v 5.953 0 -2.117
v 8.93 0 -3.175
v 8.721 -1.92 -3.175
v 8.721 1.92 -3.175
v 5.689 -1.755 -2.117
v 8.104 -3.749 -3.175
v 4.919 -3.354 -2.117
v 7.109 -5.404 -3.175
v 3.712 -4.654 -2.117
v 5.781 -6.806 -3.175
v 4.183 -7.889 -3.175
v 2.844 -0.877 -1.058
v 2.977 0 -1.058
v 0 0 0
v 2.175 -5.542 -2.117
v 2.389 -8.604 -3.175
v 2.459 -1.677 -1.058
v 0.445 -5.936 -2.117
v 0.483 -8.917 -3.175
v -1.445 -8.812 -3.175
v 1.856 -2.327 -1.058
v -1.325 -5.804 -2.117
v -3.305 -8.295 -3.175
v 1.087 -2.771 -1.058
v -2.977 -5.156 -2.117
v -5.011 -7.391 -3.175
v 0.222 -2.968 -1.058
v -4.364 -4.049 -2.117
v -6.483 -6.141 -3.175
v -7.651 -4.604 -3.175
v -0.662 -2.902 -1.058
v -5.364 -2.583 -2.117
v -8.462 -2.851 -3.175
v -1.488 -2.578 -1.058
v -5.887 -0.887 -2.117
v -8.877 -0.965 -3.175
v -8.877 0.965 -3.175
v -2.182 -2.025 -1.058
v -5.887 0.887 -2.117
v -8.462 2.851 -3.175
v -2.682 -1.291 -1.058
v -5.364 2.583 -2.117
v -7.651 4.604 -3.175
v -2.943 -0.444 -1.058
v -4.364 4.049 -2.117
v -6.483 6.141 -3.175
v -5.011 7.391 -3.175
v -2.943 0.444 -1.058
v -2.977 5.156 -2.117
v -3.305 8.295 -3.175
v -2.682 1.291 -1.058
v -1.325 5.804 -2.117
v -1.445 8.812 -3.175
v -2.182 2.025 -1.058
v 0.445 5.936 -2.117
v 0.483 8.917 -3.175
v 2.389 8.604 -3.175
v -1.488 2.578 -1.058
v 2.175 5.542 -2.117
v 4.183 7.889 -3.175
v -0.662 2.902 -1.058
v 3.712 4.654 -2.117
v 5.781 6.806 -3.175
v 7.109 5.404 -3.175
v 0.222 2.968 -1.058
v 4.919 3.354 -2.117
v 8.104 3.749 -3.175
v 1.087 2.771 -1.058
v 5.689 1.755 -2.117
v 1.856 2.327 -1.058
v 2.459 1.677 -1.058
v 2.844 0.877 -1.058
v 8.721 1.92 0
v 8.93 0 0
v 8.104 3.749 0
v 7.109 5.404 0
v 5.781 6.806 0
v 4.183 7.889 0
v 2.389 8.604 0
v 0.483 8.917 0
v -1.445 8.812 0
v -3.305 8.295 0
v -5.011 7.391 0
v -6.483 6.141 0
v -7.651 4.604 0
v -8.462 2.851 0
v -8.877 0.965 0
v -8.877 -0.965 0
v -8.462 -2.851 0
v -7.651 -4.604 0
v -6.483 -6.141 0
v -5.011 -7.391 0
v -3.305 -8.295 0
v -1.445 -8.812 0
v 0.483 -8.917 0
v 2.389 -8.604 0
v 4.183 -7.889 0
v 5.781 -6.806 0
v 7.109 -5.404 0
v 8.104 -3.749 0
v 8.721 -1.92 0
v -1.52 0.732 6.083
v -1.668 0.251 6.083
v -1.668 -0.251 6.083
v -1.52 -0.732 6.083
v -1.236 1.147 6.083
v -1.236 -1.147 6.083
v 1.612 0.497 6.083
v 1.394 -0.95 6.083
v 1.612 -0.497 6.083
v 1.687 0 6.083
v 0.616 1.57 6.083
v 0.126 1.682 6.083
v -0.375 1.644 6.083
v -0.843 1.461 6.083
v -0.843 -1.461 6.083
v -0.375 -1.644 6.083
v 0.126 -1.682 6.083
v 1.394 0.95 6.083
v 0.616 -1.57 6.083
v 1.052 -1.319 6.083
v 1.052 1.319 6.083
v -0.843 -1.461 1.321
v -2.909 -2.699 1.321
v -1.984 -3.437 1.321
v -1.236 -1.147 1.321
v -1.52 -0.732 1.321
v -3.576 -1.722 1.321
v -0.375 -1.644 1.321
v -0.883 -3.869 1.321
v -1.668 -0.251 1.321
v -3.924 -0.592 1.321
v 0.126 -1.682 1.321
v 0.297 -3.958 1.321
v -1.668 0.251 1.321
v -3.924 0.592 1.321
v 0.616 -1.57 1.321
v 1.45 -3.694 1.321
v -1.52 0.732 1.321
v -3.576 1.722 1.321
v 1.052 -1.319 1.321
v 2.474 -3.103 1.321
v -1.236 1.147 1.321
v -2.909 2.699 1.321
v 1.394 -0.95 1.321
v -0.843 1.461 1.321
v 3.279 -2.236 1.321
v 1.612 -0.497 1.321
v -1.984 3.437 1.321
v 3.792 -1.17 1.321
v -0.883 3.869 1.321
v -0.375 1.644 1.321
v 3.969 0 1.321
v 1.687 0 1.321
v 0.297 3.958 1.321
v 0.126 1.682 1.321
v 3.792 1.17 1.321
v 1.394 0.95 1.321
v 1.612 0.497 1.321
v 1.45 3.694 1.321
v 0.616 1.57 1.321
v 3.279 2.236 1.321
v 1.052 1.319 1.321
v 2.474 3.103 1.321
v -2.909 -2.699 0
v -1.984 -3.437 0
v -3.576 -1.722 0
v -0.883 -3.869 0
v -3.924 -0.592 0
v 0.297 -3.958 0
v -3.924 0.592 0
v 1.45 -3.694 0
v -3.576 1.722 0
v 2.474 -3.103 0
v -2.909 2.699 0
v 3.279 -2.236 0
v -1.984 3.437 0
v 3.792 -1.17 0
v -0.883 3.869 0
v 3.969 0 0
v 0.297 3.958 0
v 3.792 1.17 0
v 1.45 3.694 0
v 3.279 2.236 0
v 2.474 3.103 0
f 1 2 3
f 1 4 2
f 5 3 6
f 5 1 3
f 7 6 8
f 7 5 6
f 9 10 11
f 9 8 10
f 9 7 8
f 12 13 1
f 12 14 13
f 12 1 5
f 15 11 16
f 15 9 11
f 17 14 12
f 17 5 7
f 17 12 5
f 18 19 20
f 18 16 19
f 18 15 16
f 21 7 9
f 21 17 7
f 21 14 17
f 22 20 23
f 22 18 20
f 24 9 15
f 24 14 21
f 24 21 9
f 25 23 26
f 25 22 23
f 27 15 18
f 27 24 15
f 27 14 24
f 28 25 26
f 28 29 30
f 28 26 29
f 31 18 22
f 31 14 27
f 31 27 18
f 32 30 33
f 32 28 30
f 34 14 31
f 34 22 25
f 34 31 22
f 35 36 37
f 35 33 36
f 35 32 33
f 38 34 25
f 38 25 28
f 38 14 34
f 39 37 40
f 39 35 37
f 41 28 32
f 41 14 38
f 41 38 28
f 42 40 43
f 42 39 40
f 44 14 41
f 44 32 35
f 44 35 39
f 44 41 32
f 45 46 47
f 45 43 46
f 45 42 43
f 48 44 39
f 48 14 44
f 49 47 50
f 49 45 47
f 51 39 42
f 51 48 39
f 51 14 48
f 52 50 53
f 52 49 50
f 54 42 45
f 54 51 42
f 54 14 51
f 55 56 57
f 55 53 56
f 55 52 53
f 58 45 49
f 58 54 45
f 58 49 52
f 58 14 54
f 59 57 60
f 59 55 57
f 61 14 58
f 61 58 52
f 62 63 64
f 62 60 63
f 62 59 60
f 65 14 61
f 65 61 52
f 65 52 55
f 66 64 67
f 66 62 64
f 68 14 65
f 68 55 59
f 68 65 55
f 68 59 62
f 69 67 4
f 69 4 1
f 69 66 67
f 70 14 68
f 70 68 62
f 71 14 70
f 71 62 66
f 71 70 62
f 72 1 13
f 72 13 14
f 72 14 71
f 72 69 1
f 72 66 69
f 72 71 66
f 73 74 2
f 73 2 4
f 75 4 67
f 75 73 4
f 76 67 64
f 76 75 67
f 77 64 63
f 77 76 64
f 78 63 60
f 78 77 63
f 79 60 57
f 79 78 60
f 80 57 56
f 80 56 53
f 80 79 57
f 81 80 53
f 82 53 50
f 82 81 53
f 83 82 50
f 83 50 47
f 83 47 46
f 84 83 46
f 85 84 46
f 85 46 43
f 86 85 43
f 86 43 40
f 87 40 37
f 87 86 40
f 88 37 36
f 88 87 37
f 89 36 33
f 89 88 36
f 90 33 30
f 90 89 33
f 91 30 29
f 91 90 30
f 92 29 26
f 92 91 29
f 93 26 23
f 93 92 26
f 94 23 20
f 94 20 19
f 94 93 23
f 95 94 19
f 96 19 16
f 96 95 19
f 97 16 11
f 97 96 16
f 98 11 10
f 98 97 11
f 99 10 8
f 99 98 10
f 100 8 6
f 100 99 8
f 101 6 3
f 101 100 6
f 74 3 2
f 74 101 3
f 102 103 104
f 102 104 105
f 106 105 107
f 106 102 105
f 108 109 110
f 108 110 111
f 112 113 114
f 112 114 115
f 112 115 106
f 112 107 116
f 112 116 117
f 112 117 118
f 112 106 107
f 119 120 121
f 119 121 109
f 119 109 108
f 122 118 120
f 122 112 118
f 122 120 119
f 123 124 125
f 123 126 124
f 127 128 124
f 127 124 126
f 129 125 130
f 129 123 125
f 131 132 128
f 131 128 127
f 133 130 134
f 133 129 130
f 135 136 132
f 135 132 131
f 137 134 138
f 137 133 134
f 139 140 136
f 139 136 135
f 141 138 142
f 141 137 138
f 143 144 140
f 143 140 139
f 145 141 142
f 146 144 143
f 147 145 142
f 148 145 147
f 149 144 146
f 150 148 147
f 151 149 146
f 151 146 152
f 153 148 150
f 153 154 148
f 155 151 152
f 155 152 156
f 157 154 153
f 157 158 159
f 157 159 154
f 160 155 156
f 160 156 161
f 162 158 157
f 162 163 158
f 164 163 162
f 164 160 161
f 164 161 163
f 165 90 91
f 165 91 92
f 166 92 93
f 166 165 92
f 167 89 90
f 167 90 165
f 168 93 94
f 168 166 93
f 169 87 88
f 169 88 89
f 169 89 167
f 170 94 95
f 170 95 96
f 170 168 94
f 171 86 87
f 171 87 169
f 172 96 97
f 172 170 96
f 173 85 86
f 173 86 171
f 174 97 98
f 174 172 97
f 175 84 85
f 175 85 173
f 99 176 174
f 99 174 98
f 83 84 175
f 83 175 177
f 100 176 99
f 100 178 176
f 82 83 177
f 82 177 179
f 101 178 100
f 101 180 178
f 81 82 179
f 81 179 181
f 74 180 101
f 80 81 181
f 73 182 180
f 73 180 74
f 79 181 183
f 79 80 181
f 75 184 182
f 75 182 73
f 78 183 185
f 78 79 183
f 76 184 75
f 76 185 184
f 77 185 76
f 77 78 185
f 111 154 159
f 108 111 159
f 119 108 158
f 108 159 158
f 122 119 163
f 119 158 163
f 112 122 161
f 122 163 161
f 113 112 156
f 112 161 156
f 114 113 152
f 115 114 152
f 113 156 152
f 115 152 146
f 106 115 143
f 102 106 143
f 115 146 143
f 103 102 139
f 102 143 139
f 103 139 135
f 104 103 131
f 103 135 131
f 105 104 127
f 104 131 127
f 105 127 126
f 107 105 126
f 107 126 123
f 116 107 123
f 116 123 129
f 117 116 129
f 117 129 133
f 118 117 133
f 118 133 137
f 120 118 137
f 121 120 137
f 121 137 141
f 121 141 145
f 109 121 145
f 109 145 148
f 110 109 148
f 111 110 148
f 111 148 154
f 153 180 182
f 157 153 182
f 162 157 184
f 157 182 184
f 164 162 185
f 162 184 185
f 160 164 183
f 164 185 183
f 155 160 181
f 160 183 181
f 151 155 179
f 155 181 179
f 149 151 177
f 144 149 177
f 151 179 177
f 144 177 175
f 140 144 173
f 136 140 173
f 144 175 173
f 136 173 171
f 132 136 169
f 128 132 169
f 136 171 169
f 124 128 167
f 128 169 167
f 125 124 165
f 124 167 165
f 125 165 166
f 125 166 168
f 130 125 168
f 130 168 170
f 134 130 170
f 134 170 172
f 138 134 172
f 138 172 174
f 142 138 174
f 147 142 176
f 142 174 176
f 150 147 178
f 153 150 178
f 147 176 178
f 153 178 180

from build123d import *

# Parameters (mm, degrees)
F0_R      = 8.9296875
F0_R_2    = 3.96875
F0_R_3    = 3.175
F0_R_4    = 1.68671875
F1_DEPTH  = 3.175
F2_DEPTH  = 1.3208
F3_DEPTH  = 6.0833
F1_FACE_R = 8.9296875


# Not quite as in the source:
# - a length typed as a fraction of an inch, garbled in the dataset ("3 / 203.2 mm" for 3/8 in), is restored


with BuildPart() as f1:
    # F0 (on Top) → F1 (new body)
    with BuildSketch(Plane.XY):
        Circle(F0_R)
        Circle(F0_R_2, mode=Mode.SUBTRACT)
        Circle(F0_R_2)
        Circle(F0_R_3, mode=Mode.SUBTRACT)
        Circle(F0_R_3)
        Circle(F0_R_4, mode=Mode.SUBTRACT)
        Circle(F0_R_4)
    extrude(amount=-F1_DEPTH)

    # F0 (on Top) → F2 (join)
    with BuildSketch(Plane.XY):
        Circle(F0_R_2)
        Circle(F0_R_3, mode=Mode.SUBTRACT)
        Circle(F0_R_3)
        Circle(F0_R_4, mode=Mode.SUBTRACT)
        Circle(F0_R_4)
    extrude(amount=F2_DEPTH)

    # F0 (on Top) → F3 (join)
    with BuildSketch(Plane.XY):
        Circle(F0_R_4)
    extrude(amount=F3_DEPTH)

    # F1_face (on face) → F4 section 0
    with BuildSketch(Plane(origin=(0, 0, -3.175), x_dir=(1, 0, 0), z_dir=(0, 0, -1)), mode=Mode.PRIVATE) as f4_s0:
        Circle(F1_FACE_R)
    loft([f4_s0.sketch, Vertex(0, 0, 0)], mode=Mode.SUBTRACT)


solid = f1.part
